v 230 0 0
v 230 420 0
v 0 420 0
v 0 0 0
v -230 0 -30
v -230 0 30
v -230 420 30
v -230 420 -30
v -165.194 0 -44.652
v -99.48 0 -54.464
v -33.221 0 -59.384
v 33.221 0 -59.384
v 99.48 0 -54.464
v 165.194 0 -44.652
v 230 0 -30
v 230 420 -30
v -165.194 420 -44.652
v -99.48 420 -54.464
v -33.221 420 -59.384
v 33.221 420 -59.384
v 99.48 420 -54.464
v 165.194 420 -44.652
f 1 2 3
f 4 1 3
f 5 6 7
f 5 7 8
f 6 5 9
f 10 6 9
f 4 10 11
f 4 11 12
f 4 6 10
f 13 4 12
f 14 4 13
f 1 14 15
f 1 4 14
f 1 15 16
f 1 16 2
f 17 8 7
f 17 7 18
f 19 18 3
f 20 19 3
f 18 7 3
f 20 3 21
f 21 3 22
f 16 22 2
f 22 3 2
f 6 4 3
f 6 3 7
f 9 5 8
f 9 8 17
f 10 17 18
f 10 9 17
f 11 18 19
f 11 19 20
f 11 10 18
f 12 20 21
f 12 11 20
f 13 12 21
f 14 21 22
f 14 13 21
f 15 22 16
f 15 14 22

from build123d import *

# Parameters (mm, degrees)
F1_DEPTH = 420


# Not quite as in the source:
# - a feature names something its author has since deleted; it is built from what else it names


with BuildPart() as f1:
    # F0 (on Front) → F1 (new body)
    with BuildSketch(Plane.XZ):
        Polygon((-230, -30), (0, -30), (-230, 0), align=None)
        Polygon((0, -30), (230, -30), (230, 0), (0, 0), (-230, 30), (-230, 0), align=None)
        with BuildLine():
            ThreePointArc((-230, -30), (0, -60), (230, -30))
            Line((230, -30), (0, -30))
            Line((0, -30), (-230, -30))
        make_face()
    extrude(amount=-F1_DEPTH)


solid = f1.part
